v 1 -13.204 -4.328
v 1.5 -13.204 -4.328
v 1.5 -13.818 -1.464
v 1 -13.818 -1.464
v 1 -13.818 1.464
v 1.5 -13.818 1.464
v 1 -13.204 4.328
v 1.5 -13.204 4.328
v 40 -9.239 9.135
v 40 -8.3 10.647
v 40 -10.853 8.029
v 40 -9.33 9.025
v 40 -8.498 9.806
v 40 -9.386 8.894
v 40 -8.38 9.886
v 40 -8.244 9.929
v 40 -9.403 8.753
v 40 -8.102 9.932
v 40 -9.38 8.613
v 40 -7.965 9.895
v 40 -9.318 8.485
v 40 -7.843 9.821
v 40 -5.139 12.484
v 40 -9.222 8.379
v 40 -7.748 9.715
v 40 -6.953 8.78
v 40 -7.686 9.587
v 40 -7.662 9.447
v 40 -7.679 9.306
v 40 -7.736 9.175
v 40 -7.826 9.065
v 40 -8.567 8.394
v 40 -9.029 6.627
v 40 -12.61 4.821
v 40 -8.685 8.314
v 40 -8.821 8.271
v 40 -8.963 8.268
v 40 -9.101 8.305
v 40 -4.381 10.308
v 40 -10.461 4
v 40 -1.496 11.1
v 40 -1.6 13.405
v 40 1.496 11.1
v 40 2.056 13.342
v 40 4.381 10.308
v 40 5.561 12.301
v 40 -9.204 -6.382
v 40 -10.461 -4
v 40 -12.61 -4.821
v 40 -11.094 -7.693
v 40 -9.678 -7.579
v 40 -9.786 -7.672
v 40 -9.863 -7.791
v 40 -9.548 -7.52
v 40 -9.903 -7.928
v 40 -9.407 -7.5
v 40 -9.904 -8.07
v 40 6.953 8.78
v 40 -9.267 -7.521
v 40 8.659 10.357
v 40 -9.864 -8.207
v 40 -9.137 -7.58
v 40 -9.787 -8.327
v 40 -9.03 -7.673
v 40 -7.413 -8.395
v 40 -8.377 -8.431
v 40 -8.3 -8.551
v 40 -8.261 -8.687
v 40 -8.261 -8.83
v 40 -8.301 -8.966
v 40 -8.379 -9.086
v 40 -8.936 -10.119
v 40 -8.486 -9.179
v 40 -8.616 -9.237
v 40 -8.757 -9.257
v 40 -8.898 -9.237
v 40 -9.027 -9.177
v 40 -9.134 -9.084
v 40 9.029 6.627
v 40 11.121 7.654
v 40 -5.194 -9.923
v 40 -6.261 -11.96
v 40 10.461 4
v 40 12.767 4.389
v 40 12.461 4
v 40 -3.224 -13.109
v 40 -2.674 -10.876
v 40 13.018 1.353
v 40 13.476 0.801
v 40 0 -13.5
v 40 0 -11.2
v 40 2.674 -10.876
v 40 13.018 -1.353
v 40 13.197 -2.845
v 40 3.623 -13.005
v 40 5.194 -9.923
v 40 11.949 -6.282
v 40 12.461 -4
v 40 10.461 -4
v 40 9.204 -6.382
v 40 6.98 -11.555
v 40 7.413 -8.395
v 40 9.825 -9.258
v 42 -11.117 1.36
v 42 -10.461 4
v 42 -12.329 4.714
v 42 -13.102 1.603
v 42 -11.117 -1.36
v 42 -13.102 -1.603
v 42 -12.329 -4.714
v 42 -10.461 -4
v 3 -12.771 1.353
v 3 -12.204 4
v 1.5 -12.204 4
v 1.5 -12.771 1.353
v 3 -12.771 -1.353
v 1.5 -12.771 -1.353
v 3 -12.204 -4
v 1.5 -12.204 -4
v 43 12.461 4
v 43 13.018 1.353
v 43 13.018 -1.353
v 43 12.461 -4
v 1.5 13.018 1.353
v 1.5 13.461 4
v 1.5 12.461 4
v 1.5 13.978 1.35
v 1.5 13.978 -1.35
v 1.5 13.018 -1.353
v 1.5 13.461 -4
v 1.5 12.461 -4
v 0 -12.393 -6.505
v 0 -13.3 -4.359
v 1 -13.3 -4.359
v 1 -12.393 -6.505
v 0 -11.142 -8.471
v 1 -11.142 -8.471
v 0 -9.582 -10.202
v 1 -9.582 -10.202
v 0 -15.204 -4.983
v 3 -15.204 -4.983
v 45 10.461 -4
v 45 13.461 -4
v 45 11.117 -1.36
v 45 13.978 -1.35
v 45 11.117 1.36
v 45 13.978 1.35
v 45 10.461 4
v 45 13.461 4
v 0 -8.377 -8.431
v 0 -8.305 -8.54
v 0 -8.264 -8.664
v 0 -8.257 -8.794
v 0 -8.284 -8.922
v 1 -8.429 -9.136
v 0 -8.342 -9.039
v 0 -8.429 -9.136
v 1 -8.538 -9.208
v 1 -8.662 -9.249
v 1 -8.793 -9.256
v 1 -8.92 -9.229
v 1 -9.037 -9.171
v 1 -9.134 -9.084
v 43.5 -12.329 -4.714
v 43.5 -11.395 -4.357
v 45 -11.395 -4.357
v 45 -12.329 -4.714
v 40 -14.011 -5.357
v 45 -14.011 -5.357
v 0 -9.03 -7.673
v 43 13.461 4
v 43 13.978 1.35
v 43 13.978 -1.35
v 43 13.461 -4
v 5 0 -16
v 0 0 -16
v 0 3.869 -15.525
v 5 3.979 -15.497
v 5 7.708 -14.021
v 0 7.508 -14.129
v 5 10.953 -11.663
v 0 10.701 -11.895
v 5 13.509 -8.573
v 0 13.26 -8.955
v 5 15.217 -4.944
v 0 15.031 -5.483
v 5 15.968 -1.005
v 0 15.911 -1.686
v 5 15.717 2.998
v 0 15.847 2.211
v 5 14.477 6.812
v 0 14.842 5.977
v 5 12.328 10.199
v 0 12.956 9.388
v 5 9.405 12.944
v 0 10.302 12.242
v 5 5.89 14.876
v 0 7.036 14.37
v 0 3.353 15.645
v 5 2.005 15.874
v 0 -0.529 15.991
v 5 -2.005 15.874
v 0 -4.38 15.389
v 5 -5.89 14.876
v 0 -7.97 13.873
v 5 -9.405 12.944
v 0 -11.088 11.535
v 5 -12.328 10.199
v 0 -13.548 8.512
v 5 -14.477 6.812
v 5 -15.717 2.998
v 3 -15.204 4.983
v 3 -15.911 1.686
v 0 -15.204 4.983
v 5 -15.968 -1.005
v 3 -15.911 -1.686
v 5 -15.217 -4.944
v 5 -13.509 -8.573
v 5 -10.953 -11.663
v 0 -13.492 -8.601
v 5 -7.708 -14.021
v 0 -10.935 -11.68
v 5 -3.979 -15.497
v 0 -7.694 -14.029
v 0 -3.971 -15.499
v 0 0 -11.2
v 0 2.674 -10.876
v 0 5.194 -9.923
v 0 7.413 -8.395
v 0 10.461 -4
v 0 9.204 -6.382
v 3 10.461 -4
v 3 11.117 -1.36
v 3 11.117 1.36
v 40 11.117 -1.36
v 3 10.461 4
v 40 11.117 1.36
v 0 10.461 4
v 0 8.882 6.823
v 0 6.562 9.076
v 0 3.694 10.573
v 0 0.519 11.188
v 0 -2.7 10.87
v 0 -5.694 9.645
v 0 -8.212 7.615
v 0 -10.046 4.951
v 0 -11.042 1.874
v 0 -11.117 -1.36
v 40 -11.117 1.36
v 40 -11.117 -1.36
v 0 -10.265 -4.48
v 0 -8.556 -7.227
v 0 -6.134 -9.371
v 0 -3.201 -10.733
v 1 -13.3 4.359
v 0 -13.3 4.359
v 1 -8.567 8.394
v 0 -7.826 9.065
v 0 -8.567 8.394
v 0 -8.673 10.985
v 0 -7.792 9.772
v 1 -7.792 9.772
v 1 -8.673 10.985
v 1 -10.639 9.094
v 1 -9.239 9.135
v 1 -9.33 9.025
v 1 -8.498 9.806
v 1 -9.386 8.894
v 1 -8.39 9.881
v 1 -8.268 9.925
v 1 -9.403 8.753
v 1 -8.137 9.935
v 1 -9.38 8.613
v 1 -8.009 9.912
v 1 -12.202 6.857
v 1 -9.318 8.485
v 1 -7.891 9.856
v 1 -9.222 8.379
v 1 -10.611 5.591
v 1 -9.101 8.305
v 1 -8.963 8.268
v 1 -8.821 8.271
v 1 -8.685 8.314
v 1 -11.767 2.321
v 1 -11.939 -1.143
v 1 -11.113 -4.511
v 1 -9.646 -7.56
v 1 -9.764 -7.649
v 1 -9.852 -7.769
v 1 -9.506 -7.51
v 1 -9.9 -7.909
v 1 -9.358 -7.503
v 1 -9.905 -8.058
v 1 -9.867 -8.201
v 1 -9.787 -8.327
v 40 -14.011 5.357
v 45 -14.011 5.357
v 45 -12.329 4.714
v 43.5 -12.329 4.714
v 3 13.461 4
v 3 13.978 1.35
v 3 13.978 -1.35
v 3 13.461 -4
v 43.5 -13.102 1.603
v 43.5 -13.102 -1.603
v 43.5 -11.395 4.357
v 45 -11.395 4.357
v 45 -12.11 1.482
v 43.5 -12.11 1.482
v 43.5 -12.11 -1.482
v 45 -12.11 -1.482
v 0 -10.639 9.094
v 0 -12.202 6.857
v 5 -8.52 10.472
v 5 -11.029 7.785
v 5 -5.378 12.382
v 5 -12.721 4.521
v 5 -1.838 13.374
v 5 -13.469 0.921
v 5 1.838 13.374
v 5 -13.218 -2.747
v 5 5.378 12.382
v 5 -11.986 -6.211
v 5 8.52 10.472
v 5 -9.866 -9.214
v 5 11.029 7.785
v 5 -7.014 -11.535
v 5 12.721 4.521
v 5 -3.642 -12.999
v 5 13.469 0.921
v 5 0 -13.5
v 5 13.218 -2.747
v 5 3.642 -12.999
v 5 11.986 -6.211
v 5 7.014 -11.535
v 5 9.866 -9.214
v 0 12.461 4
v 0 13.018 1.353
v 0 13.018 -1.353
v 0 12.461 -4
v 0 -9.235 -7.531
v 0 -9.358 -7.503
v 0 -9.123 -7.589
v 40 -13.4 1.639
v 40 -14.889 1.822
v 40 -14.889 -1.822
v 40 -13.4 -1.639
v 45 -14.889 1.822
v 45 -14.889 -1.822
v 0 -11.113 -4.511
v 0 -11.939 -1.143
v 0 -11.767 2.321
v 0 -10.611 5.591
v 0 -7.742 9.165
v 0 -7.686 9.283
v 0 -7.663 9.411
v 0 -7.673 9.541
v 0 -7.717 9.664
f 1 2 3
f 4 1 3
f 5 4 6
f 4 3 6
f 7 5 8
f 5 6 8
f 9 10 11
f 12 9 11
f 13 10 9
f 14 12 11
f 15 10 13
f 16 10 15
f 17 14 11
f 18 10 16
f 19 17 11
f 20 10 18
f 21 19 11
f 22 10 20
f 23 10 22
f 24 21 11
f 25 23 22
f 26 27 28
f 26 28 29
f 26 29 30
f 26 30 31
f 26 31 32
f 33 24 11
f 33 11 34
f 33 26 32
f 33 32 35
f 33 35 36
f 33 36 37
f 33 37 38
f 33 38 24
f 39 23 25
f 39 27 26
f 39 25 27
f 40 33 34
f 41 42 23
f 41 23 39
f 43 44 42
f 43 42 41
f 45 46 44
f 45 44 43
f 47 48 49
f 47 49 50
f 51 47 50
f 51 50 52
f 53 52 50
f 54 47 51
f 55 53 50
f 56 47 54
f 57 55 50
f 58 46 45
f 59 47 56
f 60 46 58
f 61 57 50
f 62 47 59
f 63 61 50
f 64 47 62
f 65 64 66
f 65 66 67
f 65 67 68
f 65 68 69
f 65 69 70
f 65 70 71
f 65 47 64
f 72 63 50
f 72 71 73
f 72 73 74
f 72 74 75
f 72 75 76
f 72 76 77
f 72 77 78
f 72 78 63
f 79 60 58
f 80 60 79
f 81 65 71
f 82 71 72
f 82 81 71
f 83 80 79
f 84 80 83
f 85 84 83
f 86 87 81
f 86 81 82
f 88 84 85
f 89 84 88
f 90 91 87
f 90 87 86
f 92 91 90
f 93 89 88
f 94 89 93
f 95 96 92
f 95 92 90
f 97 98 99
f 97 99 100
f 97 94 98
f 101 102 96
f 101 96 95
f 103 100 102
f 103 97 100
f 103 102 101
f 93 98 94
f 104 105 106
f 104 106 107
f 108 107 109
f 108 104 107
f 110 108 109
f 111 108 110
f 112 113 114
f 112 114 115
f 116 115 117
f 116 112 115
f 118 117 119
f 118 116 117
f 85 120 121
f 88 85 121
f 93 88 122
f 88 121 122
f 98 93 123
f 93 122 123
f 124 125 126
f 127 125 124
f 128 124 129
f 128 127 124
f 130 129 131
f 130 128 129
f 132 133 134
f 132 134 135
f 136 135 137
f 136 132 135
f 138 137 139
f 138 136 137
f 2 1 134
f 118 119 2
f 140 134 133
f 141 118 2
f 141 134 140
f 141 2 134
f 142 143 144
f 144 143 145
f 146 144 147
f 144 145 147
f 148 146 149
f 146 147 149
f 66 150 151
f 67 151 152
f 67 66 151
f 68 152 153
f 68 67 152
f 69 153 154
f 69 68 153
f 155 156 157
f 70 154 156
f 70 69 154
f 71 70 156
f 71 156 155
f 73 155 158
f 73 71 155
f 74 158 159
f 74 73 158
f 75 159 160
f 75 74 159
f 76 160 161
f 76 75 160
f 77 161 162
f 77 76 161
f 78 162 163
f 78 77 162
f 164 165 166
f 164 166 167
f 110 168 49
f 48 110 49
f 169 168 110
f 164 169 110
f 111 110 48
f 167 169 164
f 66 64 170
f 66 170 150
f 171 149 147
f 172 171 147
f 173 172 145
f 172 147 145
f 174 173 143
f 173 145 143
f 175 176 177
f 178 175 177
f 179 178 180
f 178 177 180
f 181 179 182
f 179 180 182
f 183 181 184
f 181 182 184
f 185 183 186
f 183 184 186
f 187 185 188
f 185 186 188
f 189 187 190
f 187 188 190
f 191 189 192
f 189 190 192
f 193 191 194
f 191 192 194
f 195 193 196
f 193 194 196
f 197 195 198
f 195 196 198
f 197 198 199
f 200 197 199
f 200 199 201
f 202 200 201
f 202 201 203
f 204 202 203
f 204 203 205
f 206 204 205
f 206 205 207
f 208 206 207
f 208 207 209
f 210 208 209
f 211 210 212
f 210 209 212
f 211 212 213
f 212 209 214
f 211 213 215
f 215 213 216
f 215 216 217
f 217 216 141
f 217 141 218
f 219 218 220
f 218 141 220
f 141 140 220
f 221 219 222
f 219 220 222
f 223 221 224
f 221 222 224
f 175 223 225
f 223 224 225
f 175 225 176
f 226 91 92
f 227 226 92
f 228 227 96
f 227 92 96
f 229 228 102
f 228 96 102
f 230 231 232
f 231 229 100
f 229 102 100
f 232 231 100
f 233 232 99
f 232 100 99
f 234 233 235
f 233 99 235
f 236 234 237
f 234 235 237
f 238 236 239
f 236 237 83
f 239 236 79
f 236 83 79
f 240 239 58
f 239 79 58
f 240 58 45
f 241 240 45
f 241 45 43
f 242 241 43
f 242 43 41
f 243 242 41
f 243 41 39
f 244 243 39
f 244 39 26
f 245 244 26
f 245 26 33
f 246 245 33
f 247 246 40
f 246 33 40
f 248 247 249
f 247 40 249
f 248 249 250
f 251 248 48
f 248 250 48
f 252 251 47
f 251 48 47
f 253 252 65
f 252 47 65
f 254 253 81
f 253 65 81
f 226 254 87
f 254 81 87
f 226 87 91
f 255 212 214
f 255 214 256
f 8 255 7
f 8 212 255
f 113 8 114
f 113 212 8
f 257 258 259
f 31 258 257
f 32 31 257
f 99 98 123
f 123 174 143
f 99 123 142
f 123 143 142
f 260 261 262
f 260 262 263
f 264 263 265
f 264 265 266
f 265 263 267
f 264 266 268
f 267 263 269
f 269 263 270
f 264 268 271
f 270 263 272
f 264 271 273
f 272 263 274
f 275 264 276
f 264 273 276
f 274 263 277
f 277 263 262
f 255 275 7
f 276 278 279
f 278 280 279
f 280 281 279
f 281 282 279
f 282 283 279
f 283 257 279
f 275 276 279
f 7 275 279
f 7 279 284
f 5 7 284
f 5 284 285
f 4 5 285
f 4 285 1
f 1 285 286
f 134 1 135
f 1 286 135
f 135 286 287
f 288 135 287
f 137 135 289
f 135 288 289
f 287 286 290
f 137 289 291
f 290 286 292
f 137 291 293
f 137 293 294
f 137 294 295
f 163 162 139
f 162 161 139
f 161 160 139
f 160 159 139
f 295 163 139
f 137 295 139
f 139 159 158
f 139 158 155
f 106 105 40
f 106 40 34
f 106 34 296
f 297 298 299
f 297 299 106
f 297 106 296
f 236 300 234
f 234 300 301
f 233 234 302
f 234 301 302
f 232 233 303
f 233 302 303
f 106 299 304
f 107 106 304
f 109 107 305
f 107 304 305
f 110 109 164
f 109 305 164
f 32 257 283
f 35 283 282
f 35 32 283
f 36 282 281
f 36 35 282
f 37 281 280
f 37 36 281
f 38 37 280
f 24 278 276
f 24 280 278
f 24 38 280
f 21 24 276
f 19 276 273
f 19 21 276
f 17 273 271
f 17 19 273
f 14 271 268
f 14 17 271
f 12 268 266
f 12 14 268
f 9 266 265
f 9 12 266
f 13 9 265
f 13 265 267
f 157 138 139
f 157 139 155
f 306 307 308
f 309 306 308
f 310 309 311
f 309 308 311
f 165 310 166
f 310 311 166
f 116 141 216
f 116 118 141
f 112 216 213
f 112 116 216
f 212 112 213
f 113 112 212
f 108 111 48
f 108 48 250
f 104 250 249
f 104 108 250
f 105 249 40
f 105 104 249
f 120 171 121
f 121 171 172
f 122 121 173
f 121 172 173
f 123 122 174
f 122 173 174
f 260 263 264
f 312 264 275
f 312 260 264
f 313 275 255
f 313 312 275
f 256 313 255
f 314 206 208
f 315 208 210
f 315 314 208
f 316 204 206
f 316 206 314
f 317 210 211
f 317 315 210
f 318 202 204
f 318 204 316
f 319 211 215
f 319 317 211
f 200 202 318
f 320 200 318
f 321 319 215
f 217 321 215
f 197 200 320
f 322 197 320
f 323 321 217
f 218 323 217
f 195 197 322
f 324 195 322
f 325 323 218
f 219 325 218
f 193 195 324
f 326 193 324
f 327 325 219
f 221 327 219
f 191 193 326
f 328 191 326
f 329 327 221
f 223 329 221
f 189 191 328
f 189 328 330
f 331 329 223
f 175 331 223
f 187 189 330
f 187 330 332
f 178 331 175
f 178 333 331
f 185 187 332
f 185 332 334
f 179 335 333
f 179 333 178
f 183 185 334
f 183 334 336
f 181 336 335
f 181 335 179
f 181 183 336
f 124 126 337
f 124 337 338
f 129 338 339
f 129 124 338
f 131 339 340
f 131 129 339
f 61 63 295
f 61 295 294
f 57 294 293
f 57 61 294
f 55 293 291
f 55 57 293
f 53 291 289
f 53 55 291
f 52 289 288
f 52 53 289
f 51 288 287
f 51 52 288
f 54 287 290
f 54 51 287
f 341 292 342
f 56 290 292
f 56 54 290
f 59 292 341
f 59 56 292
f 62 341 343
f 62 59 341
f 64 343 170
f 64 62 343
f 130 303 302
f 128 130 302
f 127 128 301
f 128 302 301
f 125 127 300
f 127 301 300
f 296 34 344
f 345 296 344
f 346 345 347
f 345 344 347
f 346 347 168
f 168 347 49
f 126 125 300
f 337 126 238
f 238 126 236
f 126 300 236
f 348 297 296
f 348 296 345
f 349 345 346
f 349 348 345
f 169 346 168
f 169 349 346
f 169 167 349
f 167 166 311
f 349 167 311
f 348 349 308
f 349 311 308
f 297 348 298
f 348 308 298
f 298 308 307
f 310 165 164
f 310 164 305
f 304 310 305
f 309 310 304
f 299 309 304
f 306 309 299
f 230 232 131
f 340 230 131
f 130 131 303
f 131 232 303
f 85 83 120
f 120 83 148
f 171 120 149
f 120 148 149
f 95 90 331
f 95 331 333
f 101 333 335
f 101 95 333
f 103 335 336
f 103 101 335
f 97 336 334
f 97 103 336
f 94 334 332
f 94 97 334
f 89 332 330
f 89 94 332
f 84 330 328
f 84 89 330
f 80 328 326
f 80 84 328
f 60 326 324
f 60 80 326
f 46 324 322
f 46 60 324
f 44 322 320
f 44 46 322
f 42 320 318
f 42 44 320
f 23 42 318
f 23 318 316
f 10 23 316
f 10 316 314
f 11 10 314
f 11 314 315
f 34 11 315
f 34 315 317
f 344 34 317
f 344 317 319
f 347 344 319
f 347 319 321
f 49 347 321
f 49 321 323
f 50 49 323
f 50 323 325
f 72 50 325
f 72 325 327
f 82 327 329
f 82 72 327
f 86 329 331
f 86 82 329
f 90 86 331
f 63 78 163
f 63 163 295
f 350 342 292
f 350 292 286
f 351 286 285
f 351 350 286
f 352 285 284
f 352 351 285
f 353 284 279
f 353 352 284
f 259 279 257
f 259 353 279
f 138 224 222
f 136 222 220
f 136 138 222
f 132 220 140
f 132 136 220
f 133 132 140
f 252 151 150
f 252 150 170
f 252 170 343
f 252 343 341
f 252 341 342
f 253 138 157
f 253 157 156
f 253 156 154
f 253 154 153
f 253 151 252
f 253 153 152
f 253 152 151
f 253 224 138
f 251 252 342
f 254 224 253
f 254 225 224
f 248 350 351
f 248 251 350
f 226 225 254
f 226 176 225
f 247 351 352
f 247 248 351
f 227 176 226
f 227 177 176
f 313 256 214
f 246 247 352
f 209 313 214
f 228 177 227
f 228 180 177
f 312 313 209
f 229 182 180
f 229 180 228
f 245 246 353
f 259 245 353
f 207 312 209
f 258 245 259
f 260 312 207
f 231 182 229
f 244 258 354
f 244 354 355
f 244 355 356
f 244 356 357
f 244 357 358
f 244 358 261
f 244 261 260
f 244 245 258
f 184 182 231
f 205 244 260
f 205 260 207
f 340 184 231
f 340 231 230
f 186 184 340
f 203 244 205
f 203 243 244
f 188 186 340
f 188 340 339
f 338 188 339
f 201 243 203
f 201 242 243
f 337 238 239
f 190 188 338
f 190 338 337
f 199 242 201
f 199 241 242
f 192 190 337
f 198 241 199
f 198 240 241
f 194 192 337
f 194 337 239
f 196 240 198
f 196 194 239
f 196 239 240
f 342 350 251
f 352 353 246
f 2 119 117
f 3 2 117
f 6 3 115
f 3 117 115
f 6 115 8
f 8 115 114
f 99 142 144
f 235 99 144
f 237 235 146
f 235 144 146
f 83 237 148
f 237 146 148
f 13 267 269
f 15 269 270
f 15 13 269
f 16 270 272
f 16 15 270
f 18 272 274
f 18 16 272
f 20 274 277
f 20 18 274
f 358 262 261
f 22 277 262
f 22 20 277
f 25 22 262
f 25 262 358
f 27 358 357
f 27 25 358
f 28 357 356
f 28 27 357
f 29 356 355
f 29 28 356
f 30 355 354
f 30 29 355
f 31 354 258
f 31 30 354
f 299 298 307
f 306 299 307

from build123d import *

# Parameters (mm, degrees)
SKETCH1_R               = 16
BOSS_EXTRUDE1_DEPTH     = 40
SKETCH2_R               = 11.2
CUT_EXTRUDE1_DEPTH      = 46.956501172
SKETCH3_OUTSIDE_W       = 46.08
SKETCH3_OUTSIDE_H       = 46.08
SKETCH3_OUTSIDE_R       = 13.5
CUT_EXTRUDE2_DEPTH      = 35
CUT_EXTRUDE3_START      = -3
CUT_EXTRUDE3_DEPTH      = 3
CUT_EXTRUDE9_DEPTH      = 46.956501172
CUT_EXTRUDE9_DEPTH_BACK = 3
BOSS_EXTRUDE3_START     = -1.5
BOSS_EXTRUDE3_DEPTH     = 1.5
BOSS_EXTRUDE4_START     = 5
BOSS_EXTRUDE4_DEPTH     = 5
CUT_EXTRUDE10_START     = 3
CUT_EXTRUDE10_DEPTH     = 3
CUT_EXTRUDE11_DEPTH     = 3
BOSS_EXTRUDE5_DEPTH     = 1.5
CUT_EXTRUDE12_DEPTH     = 46.956501172
CUT_EXTRUDE13_DEPTH     = 1


with BuildPart() as part:
    # Sketch1 → Boss-Extrude1 (new body)
    with BuildSketch(Plane(origin=(0, 0, 0), x_dir=(0, 0, -1), z_dir=(1, 0, 0))):
        Circle(SKETCH1_R)
    extrude(amount=BOSS_EXTRUDE1_DEPTH)

    # Sketch2 → Cut-Extrude1 (cut, through all)
    with BuildSketch(Plane(origin=(40, 0, 0), x_dir=(0, 0, -1), z_dir=(1, 0, 0))):
        Circle(SKETCH2_R)
    extrude(amount=-CUT_EXTRUDE1_DEPTH, mode=Mode.SUBTRACT)

    # Sketch3 outside → Cut-Extrude2 (cut)
    with BuildSketch(Plane(origin=(40, 0, 0), x_dir=(0, 0, -1), z_dir=(1, 0, 0))):
        Rectangle(SKETCH3_OUTSIDE_W, SKETCH3_OUTSIDE_H)
        Circle(SKETCH3_OUTSIDE_R, mode=Mode.SUBTRACT)
    extrude(amount=-CUT_EXTRUDE2_DEPTH, mode=Mode.SUBTRACT)

    # Sketch4 → Cut-Extrude3 (cut)
    with BuildSketch(Plane.ZY.offset(CUT_EXTRUDE3_START)):
        with BuildLine():
            Line((-4, 10.461357464), (-4, 13.461357464))
            ThreePointArc((-4, 13.461357464), (0, 14.043081741), (4, 13.461357464))
            Line((4, 13.461357464), (4, 10.461357464))
            ThreePointArc((4, 10.461357464), (0, 11.2), (-4, 10.461357464))
        make_face()
    extrude(amount=CUT_EXTRUDE3_DEPTH, mode=Mode.SUBTRACT)

    # Sketch11 → Cut-Extrude9 (cut, two sides: drawn at the far end of the back side and taken through both)
    with BuildSketch(Plane.ZY.offset(-CUT_EXTRUDE9_DEPTH_BACK)):
        with BuildLine():
            Line((31.521155816, -96.172447268), (4.983269846, -15.204177769))
            Line((4.983269846, -15.204177769), (4, -12.204177769))
            ThreePointArc((4, -12.204177769), (0, -12.842972982), (-4, -12.204177769))
            Line((-4, -12.204177769), (-4.983269846, -15.204177769))
            Line((-4.983269846, -15.204177769), (-31.521155816, -96.172447268))
            Line((-31.521155816, -96.172447268), (-31.521155816, -266.585123526))
            Line((-31.521155816, -266.585123526), (31.521155816, -266.585123526))
            Line((31.521155816, -266.585123526), (31.521155816, -96.172447268))
        make_face()
    extrude(amount=CUT_EXTRUDE9_DEPTH + CUT_EXTRUDE9_DEPTH_BACK, mode=Mode.SUBTRACT)

    # Sketch15 → Boss-Extrude3 (add)
    with BuildSketch(Plane.ZY.offset(BOSS_EXTRUDE3_START)):
        with BuildLine():
            Line((-4, -12.204177769), (-4.327756615, -13.204177769))
            ThreePointArc((-4.327756615, -13.204177769), (0, -13.895315322), (4.327756615, -13.204177769))
            Line((4.327756615, -13.204177769), (4, -12.204177769))
            ThreePointArc((4, -12.204177769), (0, -12.842972982), (-4, -12.204177769))
        make_face()
        with BuildLine():
            Line((-4, 12.461357464), (-4, 13.461357464))
            ThreePointArc((-4, 13.461357464), (0, 14.043081741), (4, 13.461357464))
            Line((4, 13.461357464), (4, 12.461357464))
            ThreePointArc((4, 12.461357464), (0, 13.087605964), (-4, 12.461357464))
        make_face()
    extrude(amount=BOSS_EXTRUDE3_DEPTH)

    # Sketch16 → Boss-Extrude4 (add)
    with BuildSketch(Plane(origin=(40, 0, 0), x_dir=(0, 0, -1), z_dir=(1, 0, 0)).offset(BOSS_EXTRUDE4_START)):
        with BuildLine():
            Line((-4, 10.461357464), (-4, 13.461357464))
            ThreePointArc((-4, 13.461357464), (0, 14.043081741), (4, 13.461357464))
            Line((4, 13.461357464), (4, 10.461357464))
            ThreePointArc((4, 10.461357464), (0, 11.2), (-4, 10.461357464))
        make_face()
        with BuildLine():
            Line((-4, -10.461357464), (-5.357142857, -14.010746604))
            ThreePointArc((-5.357142857, -14.010746604), (0, -15), (5.357142857, -14.010746604))
            Line((5.357142857, -14.010746604), (4, -10.461357464))
            ThreePointArc((4, -10.461357464), (0, -11.2), (-4, -10.461357464))
        make_face()
    extrude(amount=-BOSS_EXTRUDE4_DEPTH)

    # Sketch17 → Cut-Extrude10 (cut)
    with BuildSketch(Plane(origin=(40, 0, 0), x_dir=(0, 0, -1), z_dir=(1, 0, 0)).offset(CUT_EXTRUDE10_START)):
        with BuildLine():
            Line((-4, 13.461357464), (-4, 12.461357464))
            ThreePointArc((-4, 12.461357464), (0, 13.087605964), (4, 12.461357464))
            Line((4, 12.461357464), (4, 13.461357464))
            ThreePointArc((4, 13.461357464), (0, 14.043081741), (-4, 13.461357464))
        make_face()
    extrude(amount=-CUT_EXTRUDE10_DEPTH, mode=Mode.SUBTRACT)

    # Sketch18 → Cut-Extrude11 (cut)
    with BuildSketch(Plane(origin=(45, 0, 0), x_dir=(0, 0, -1), z_dir=(1, 0, 0))):
        with BuildLine():
            Line((-4, -10.461357464), (-4.714285714, -12.329457012))
            ThreePointArc((-4.714285714, -12.329457012), (0, -13.2), (4.714285714, -12.329457012))
            Line((4.714285714, -12.329457012), (4, -10.461357464))
            ThreePointArc((4, -10.461357464), (0, -11.2), (-4, -10.461357464))
        make_face()
    extrude(amount=-CUT_EXTRUDE11_DEPTH, mode=Mode.SUBTRACT)

    # Sketch21 → Boss-Extrude5 (add)
    with BuildSketch(Plane(origin=(45, 0, 0), x_dir=(0, 0, -1), z_dir=(1, 0, 0))):
        with BuildLine():
            Line((-4.714285714, -12.329457012), (-4.357142857, -11.395407238))
            ThreePointArc((-4.357142857, -11.395407238), (0, -12.2), (4.357142857, -11.395407238))
            Line((4.357142857, -11.395407238), (4.714285714, -12.329457012))
            ThreePointArc((4.714285714, -12.329457012), (0, -13.2), (-4.714285714, -12.329457012))
        make_face()
    extrude(amount=-BOSS_EXTRUDE5_DEPTH)

    # Sketch22 → Cut-Extrude12 (cut, through all)
    with BuildSketch(Plane(origin=(40, 0, 0), x_dir=(0, 0, -1), z_dir=(1, 0, 0))):
        with BuildLine():
            Line((7.673498409, -9.029962065), (8.430853573, -8.376958883))
            ThreePointArc((8.430853573, -8.376958883), (9.136032746, -8.429134874), (9.083856755, -9.134314047))
            Line((9.083856755, -9.134314047), (8.326501591, -9.787317229))
            ThreePointArc((8.326501591, -9.787317229), (7.621322418, -9.735141237), (7.673498409, -9.029962065))
        make_face()
        with BuildLine():
            Line((-9.134721879, -9.238785274), (-9.806253772, -8.497809622))
            ThreePointArc((-9.806253772, -8.497809622), (-9.771531893, -7.79155585), (-9.065278121, -7.826277729))
            Line((-9.065278121, -7.826277729), (-8.393746228, -8.567253381))
            ThreePointArc((-8.393746228, -8.567253381), (-8.428468107, -9.273507153), (-9.134721879, -9.238785274))
        make_face()
    extrude(amount=-CUT_EXTRUDE12_DEPTH, mode=Mode.SUBTRACT)

    # Sketch23 → Cut-Extrude13 (cut)
    with BuildSketch(Plane.ZY):
        with BuildLine():
            Line((9.771531893, -7.79155585), (10.985476817, -8.672656141))
            ThreePointArc((10.985476817, -8.672656141), (0.600129097, -13.983401249), (-10.202038674, -9.581965994))
            Line((-10.202038674, -9.581965994), (-9.136032746, -8.429134874))
            Line((-9.136032746, -8.429134874), (-7.502618183, -9.357538492))
            ThreePointArc((-7.502618183, -9.357538492), (0.59553752, -11.979070969), (8.393746228, -8.567253381))
            Line((8.393746228, -8.567253381), (9.771531893, -7.79155585))
        make_face()
    extrude(amount=-CUT_EXTRUDE13_DEPTH, mode=Mode.SUBTRACT)


solid = part.part
